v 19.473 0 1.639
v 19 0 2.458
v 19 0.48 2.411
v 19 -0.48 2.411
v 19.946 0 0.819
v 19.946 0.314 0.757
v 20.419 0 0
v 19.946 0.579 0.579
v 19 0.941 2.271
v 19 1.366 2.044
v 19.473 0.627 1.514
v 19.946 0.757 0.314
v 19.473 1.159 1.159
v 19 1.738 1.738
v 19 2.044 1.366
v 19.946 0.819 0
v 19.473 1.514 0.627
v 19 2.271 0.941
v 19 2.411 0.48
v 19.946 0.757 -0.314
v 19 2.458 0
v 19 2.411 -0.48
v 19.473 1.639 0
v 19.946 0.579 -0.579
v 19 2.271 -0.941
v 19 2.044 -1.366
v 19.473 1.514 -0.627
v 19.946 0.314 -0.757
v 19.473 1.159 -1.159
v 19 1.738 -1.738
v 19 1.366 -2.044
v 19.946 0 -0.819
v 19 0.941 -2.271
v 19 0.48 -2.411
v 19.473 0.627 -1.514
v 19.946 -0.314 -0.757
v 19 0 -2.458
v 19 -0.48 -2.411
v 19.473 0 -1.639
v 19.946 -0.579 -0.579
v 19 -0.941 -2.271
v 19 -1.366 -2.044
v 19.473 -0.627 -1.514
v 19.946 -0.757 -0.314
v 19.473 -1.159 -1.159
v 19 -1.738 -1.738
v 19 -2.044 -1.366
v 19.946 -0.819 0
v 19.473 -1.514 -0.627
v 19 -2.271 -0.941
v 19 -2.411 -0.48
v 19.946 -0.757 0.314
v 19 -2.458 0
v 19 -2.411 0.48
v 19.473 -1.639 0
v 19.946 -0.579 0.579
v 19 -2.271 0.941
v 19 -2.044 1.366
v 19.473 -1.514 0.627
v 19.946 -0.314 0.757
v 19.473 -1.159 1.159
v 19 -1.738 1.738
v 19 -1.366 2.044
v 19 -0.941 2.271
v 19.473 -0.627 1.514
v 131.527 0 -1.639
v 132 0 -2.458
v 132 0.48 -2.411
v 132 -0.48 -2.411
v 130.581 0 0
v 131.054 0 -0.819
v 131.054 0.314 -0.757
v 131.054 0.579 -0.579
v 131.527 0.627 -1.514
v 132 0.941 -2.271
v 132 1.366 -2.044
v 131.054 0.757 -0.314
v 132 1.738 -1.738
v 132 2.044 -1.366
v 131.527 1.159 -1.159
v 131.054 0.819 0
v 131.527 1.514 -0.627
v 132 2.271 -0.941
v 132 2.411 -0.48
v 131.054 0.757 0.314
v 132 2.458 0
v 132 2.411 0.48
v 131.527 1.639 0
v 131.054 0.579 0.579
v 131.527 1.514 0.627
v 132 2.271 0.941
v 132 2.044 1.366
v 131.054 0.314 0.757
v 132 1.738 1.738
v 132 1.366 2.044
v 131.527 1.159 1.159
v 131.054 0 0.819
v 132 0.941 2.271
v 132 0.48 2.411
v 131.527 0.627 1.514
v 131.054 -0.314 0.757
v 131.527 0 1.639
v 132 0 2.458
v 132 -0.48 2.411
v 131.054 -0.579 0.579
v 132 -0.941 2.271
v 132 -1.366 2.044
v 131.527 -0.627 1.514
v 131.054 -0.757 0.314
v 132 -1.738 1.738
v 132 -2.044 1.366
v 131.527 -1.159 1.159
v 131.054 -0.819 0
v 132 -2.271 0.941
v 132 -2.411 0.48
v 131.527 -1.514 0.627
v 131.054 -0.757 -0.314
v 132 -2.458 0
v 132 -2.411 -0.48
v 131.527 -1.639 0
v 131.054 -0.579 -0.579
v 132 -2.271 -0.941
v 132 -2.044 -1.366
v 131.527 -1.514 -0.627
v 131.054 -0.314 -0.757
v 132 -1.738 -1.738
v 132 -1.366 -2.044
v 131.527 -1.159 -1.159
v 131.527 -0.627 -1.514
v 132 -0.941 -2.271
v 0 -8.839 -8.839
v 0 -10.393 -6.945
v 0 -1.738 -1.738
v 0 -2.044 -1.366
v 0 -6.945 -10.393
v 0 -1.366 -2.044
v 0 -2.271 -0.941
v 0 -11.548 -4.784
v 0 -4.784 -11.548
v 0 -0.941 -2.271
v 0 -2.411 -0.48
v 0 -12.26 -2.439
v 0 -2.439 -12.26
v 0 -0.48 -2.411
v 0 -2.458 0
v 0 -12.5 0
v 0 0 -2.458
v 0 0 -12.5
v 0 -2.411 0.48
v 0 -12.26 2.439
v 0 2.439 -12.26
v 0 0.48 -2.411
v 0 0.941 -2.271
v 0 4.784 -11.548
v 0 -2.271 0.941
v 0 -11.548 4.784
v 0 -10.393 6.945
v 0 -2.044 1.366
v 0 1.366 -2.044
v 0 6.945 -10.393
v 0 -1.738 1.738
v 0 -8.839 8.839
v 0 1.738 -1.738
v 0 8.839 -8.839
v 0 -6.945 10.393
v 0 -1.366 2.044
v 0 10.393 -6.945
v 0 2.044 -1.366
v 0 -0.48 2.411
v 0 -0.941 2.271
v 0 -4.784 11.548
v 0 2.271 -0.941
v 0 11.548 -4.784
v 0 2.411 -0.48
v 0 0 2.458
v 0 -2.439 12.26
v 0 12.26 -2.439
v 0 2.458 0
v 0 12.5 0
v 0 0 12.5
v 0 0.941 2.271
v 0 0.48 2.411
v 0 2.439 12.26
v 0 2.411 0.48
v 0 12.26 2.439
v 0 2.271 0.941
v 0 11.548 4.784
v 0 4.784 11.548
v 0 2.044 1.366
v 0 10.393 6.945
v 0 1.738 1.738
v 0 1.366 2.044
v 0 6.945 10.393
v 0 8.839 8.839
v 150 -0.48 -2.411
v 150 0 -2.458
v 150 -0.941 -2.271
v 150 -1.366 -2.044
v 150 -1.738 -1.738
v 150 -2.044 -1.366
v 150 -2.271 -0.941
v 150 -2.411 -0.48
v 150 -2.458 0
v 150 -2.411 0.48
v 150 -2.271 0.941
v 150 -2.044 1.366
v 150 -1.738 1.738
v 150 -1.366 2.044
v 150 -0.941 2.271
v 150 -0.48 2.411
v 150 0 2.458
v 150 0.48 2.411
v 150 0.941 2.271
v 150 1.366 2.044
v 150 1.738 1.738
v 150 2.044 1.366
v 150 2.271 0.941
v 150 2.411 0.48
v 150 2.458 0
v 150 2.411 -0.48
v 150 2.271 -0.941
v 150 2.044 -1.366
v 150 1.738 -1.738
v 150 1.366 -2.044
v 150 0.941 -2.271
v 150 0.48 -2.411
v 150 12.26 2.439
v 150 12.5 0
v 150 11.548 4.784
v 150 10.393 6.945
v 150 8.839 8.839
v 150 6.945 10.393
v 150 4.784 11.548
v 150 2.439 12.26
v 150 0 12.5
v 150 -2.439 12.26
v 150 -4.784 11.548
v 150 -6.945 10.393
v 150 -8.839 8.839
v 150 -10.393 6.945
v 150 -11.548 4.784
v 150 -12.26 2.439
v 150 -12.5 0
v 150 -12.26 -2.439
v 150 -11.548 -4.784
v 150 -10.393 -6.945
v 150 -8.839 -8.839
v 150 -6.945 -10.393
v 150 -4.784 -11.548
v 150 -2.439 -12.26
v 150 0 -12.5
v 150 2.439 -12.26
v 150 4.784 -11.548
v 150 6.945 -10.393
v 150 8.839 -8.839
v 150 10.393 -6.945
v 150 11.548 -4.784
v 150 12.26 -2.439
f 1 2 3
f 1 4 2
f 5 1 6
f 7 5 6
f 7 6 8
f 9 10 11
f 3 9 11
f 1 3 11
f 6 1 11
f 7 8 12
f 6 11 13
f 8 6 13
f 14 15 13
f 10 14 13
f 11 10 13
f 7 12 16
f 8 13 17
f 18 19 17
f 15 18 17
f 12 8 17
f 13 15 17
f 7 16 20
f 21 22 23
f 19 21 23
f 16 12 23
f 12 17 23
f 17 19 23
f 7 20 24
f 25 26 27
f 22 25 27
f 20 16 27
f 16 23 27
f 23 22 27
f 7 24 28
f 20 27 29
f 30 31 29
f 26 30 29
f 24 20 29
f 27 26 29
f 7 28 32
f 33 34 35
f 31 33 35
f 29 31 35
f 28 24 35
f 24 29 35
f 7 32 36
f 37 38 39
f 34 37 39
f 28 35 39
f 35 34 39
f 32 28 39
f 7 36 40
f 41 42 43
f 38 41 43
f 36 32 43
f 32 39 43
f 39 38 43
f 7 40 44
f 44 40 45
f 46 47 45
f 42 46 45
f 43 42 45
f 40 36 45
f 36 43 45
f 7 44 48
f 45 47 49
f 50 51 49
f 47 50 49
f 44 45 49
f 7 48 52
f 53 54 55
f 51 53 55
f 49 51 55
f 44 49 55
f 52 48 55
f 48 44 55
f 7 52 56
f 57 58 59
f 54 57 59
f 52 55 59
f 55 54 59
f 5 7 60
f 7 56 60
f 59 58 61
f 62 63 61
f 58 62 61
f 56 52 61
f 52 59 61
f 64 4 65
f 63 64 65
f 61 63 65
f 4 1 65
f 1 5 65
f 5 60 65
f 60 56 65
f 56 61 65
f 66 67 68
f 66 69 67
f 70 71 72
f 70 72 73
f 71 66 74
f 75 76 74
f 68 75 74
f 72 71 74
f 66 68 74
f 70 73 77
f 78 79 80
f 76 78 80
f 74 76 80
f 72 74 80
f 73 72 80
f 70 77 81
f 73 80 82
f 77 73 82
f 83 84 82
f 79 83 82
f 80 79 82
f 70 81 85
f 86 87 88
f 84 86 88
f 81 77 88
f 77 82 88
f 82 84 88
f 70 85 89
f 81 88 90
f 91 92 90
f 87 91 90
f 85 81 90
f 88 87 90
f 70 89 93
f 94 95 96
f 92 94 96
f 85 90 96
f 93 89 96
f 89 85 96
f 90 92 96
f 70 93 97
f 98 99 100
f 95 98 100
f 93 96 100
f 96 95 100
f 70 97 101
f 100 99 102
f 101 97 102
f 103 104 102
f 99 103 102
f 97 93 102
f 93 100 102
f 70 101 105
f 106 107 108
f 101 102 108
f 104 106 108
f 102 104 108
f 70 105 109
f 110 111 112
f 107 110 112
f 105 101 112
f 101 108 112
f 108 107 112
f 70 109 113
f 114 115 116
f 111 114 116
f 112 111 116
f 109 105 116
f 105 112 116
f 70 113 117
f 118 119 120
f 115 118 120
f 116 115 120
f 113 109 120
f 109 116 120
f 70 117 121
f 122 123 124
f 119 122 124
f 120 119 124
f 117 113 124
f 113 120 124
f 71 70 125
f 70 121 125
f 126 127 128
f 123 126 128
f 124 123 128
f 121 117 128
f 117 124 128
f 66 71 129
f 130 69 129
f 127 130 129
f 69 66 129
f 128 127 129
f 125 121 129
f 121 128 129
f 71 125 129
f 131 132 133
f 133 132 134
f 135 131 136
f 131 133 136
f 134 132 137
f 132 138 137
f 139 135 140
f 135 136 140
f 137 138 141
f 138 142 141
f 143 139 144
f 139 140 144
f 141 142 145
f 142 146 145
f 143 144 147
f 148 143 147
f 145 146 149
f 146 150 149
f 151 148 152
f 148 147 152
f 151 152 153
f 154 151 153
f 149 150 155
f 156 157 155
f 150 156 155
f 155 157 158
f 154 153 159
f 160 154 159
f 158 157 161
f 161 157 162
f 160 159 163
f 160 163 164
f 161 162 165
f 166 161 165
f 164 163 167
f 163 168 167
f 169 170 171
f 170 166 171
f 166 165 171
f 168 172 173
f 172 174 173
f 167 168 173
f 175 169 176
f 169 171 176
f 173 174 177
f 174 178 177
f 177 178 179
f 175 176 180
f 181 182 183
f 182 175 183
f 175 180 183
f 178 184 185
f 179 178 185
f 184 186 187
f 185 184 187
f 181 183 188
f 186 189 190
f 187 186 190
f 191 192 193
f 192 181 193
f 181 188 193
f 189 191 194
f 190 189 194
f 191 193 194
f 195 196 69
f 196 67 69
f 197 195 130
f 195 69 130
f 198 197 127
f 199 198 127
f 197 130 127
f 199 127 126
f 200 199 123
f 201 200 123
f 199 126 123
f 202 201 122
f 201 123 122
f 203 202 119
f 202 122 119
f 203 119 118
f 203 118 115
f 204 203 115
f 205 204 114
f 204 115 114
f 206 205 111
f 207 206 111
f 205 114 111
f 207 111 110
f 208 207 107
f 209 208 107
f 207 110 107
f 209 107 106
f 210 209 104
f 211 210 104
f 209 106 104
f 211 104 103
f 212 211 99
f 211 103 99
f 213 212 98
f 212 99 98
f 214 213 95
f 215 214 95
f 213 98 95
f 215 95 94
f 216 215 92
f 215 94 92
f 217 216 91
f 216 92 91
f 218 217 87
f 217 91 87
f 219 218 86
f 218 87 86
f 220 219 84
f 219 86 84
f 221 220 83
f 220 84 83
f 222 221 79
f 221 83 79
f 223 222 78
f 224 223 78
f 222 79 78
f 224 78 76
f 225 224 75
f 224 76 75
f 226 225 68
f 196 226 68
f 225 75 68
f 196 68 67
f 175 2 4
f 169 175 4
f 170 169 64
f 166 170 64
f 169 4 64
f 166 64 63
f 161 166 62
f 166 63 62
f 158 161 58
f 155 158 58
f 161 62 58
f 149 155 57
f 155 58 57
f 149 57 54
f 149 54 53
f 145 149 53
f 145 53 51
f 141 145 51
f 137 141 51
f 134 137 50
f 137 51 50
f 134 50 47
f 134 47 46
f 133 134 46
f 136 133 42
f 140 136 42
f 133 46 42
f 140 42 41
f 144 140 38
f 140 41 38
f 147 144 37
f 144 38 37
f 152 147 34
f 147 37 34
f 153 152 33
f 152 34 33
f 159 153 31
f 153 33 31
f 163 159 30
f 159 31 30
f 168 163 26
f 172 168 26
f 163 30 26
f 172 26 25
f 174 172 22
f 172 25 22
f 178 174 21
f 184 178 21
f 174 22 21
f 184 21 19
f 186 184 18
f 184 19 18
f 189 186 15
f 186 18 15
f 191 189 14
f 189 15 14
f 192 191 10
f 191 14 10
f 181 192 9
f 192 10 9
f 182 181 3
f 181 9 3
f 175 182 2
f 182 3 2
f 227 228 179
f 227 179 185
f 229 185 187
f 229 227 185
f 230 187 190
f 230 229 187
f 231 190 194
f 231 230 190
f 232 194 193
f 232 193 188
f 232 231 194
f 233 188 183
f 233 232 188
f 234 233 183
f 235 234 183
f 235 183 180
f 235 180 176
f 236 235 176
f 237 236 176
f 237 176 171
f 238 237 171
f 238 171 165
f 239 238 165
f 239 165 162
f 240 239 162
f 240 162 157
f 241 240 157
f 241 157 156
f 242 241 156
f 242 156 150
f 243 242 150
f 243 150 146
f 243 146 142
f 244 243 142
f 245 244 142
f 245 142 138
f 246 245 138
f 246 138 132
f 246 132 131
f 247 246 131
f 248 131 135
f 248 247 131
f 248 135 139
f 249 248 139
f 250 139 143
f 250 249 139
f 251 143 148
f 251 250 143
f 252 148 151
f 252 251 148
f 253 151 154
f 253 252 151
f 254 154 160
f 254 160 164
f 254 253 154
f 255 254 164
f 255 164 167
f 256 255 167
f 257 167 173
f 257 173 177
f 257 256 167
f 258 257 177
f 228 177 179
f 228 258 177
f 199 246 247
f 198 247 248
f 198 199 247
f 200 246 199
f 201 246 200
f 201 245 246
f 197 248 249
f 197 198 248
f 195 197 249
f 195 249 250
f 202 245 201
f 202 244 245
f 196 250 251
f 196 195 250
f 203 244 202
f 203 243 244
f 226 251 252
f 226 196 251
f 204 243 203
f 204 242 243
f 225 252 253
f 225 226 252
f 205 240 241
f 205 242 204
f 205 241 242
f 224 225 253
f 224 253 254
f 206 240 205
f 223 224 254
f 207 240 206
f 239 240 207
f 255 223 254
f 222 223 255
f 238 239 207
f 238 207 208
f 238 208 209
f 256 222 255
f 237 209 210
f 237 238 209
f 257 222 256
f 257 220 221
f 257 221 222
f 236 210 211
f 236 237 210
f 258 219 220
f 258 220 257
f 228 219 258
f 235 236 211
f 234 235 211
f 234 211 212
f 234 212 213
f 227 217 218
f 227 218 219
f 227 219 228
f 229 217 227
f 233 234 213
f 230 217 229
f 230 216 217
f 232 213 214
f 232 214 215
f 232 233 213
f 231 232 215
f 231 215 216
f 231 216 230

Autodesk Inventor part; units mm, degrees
ref_plane "Płaszczyzna początkowa" through (0, 0, 0) normal (1, 0, 0) x (0, 1, 0)
ref_plane "XZ Plane" through (0, 0, 0) normal (0, 1, 0) x (-1, 0, 0)
ref_plane "XY Plane" through (0, 0, 0) normal (0, 0, 1) x (1, 0, 0)
sketch "Szkic główny" plane through (0, 0, 0) normal (0, 0, 1) x (1, 0, 0)
  line L0 (0, 0) -> (150, 0)
  line L1 (0, 0) -> (0, 12.5)
  line L2 (150, 12.5) -> (150, 0)
  line L3 (0, 12.5) -> (150, 12.5)
  dimension "d3" = 25
revolve "Obrót1" add sketch "Szkic główny" angle 360 about axis through (0, 0, 0) along (1, 0, 0)
sketch "Szkic3" plane through (0, 0, 0) normal (-1, 0, 0) x (0, 0, 1)
  point P0 (0, 0)
hole "Otwór1" at (0, 0, 0) direction (1, 0, 0) diameter 4.917 depth 19 tip angle 120 thread size "M6x1" class "6H" standard "ISO Metric profile"
sketch "Szkic4" plane through (150, 0, 0) normal (1, 0, 0) x (0, 0, -1)
  point P0 (0, 0)
hole "Otwór2" at (150, 0, 0) direction (-1, 0, 0) diameter 4.917 depth 18 tip angle 120 thread size "M6x1" class "6H" standard "ISO Metric profile"
equation "\"Length\" = 150"
properties part number "Wał" material "Steel"
